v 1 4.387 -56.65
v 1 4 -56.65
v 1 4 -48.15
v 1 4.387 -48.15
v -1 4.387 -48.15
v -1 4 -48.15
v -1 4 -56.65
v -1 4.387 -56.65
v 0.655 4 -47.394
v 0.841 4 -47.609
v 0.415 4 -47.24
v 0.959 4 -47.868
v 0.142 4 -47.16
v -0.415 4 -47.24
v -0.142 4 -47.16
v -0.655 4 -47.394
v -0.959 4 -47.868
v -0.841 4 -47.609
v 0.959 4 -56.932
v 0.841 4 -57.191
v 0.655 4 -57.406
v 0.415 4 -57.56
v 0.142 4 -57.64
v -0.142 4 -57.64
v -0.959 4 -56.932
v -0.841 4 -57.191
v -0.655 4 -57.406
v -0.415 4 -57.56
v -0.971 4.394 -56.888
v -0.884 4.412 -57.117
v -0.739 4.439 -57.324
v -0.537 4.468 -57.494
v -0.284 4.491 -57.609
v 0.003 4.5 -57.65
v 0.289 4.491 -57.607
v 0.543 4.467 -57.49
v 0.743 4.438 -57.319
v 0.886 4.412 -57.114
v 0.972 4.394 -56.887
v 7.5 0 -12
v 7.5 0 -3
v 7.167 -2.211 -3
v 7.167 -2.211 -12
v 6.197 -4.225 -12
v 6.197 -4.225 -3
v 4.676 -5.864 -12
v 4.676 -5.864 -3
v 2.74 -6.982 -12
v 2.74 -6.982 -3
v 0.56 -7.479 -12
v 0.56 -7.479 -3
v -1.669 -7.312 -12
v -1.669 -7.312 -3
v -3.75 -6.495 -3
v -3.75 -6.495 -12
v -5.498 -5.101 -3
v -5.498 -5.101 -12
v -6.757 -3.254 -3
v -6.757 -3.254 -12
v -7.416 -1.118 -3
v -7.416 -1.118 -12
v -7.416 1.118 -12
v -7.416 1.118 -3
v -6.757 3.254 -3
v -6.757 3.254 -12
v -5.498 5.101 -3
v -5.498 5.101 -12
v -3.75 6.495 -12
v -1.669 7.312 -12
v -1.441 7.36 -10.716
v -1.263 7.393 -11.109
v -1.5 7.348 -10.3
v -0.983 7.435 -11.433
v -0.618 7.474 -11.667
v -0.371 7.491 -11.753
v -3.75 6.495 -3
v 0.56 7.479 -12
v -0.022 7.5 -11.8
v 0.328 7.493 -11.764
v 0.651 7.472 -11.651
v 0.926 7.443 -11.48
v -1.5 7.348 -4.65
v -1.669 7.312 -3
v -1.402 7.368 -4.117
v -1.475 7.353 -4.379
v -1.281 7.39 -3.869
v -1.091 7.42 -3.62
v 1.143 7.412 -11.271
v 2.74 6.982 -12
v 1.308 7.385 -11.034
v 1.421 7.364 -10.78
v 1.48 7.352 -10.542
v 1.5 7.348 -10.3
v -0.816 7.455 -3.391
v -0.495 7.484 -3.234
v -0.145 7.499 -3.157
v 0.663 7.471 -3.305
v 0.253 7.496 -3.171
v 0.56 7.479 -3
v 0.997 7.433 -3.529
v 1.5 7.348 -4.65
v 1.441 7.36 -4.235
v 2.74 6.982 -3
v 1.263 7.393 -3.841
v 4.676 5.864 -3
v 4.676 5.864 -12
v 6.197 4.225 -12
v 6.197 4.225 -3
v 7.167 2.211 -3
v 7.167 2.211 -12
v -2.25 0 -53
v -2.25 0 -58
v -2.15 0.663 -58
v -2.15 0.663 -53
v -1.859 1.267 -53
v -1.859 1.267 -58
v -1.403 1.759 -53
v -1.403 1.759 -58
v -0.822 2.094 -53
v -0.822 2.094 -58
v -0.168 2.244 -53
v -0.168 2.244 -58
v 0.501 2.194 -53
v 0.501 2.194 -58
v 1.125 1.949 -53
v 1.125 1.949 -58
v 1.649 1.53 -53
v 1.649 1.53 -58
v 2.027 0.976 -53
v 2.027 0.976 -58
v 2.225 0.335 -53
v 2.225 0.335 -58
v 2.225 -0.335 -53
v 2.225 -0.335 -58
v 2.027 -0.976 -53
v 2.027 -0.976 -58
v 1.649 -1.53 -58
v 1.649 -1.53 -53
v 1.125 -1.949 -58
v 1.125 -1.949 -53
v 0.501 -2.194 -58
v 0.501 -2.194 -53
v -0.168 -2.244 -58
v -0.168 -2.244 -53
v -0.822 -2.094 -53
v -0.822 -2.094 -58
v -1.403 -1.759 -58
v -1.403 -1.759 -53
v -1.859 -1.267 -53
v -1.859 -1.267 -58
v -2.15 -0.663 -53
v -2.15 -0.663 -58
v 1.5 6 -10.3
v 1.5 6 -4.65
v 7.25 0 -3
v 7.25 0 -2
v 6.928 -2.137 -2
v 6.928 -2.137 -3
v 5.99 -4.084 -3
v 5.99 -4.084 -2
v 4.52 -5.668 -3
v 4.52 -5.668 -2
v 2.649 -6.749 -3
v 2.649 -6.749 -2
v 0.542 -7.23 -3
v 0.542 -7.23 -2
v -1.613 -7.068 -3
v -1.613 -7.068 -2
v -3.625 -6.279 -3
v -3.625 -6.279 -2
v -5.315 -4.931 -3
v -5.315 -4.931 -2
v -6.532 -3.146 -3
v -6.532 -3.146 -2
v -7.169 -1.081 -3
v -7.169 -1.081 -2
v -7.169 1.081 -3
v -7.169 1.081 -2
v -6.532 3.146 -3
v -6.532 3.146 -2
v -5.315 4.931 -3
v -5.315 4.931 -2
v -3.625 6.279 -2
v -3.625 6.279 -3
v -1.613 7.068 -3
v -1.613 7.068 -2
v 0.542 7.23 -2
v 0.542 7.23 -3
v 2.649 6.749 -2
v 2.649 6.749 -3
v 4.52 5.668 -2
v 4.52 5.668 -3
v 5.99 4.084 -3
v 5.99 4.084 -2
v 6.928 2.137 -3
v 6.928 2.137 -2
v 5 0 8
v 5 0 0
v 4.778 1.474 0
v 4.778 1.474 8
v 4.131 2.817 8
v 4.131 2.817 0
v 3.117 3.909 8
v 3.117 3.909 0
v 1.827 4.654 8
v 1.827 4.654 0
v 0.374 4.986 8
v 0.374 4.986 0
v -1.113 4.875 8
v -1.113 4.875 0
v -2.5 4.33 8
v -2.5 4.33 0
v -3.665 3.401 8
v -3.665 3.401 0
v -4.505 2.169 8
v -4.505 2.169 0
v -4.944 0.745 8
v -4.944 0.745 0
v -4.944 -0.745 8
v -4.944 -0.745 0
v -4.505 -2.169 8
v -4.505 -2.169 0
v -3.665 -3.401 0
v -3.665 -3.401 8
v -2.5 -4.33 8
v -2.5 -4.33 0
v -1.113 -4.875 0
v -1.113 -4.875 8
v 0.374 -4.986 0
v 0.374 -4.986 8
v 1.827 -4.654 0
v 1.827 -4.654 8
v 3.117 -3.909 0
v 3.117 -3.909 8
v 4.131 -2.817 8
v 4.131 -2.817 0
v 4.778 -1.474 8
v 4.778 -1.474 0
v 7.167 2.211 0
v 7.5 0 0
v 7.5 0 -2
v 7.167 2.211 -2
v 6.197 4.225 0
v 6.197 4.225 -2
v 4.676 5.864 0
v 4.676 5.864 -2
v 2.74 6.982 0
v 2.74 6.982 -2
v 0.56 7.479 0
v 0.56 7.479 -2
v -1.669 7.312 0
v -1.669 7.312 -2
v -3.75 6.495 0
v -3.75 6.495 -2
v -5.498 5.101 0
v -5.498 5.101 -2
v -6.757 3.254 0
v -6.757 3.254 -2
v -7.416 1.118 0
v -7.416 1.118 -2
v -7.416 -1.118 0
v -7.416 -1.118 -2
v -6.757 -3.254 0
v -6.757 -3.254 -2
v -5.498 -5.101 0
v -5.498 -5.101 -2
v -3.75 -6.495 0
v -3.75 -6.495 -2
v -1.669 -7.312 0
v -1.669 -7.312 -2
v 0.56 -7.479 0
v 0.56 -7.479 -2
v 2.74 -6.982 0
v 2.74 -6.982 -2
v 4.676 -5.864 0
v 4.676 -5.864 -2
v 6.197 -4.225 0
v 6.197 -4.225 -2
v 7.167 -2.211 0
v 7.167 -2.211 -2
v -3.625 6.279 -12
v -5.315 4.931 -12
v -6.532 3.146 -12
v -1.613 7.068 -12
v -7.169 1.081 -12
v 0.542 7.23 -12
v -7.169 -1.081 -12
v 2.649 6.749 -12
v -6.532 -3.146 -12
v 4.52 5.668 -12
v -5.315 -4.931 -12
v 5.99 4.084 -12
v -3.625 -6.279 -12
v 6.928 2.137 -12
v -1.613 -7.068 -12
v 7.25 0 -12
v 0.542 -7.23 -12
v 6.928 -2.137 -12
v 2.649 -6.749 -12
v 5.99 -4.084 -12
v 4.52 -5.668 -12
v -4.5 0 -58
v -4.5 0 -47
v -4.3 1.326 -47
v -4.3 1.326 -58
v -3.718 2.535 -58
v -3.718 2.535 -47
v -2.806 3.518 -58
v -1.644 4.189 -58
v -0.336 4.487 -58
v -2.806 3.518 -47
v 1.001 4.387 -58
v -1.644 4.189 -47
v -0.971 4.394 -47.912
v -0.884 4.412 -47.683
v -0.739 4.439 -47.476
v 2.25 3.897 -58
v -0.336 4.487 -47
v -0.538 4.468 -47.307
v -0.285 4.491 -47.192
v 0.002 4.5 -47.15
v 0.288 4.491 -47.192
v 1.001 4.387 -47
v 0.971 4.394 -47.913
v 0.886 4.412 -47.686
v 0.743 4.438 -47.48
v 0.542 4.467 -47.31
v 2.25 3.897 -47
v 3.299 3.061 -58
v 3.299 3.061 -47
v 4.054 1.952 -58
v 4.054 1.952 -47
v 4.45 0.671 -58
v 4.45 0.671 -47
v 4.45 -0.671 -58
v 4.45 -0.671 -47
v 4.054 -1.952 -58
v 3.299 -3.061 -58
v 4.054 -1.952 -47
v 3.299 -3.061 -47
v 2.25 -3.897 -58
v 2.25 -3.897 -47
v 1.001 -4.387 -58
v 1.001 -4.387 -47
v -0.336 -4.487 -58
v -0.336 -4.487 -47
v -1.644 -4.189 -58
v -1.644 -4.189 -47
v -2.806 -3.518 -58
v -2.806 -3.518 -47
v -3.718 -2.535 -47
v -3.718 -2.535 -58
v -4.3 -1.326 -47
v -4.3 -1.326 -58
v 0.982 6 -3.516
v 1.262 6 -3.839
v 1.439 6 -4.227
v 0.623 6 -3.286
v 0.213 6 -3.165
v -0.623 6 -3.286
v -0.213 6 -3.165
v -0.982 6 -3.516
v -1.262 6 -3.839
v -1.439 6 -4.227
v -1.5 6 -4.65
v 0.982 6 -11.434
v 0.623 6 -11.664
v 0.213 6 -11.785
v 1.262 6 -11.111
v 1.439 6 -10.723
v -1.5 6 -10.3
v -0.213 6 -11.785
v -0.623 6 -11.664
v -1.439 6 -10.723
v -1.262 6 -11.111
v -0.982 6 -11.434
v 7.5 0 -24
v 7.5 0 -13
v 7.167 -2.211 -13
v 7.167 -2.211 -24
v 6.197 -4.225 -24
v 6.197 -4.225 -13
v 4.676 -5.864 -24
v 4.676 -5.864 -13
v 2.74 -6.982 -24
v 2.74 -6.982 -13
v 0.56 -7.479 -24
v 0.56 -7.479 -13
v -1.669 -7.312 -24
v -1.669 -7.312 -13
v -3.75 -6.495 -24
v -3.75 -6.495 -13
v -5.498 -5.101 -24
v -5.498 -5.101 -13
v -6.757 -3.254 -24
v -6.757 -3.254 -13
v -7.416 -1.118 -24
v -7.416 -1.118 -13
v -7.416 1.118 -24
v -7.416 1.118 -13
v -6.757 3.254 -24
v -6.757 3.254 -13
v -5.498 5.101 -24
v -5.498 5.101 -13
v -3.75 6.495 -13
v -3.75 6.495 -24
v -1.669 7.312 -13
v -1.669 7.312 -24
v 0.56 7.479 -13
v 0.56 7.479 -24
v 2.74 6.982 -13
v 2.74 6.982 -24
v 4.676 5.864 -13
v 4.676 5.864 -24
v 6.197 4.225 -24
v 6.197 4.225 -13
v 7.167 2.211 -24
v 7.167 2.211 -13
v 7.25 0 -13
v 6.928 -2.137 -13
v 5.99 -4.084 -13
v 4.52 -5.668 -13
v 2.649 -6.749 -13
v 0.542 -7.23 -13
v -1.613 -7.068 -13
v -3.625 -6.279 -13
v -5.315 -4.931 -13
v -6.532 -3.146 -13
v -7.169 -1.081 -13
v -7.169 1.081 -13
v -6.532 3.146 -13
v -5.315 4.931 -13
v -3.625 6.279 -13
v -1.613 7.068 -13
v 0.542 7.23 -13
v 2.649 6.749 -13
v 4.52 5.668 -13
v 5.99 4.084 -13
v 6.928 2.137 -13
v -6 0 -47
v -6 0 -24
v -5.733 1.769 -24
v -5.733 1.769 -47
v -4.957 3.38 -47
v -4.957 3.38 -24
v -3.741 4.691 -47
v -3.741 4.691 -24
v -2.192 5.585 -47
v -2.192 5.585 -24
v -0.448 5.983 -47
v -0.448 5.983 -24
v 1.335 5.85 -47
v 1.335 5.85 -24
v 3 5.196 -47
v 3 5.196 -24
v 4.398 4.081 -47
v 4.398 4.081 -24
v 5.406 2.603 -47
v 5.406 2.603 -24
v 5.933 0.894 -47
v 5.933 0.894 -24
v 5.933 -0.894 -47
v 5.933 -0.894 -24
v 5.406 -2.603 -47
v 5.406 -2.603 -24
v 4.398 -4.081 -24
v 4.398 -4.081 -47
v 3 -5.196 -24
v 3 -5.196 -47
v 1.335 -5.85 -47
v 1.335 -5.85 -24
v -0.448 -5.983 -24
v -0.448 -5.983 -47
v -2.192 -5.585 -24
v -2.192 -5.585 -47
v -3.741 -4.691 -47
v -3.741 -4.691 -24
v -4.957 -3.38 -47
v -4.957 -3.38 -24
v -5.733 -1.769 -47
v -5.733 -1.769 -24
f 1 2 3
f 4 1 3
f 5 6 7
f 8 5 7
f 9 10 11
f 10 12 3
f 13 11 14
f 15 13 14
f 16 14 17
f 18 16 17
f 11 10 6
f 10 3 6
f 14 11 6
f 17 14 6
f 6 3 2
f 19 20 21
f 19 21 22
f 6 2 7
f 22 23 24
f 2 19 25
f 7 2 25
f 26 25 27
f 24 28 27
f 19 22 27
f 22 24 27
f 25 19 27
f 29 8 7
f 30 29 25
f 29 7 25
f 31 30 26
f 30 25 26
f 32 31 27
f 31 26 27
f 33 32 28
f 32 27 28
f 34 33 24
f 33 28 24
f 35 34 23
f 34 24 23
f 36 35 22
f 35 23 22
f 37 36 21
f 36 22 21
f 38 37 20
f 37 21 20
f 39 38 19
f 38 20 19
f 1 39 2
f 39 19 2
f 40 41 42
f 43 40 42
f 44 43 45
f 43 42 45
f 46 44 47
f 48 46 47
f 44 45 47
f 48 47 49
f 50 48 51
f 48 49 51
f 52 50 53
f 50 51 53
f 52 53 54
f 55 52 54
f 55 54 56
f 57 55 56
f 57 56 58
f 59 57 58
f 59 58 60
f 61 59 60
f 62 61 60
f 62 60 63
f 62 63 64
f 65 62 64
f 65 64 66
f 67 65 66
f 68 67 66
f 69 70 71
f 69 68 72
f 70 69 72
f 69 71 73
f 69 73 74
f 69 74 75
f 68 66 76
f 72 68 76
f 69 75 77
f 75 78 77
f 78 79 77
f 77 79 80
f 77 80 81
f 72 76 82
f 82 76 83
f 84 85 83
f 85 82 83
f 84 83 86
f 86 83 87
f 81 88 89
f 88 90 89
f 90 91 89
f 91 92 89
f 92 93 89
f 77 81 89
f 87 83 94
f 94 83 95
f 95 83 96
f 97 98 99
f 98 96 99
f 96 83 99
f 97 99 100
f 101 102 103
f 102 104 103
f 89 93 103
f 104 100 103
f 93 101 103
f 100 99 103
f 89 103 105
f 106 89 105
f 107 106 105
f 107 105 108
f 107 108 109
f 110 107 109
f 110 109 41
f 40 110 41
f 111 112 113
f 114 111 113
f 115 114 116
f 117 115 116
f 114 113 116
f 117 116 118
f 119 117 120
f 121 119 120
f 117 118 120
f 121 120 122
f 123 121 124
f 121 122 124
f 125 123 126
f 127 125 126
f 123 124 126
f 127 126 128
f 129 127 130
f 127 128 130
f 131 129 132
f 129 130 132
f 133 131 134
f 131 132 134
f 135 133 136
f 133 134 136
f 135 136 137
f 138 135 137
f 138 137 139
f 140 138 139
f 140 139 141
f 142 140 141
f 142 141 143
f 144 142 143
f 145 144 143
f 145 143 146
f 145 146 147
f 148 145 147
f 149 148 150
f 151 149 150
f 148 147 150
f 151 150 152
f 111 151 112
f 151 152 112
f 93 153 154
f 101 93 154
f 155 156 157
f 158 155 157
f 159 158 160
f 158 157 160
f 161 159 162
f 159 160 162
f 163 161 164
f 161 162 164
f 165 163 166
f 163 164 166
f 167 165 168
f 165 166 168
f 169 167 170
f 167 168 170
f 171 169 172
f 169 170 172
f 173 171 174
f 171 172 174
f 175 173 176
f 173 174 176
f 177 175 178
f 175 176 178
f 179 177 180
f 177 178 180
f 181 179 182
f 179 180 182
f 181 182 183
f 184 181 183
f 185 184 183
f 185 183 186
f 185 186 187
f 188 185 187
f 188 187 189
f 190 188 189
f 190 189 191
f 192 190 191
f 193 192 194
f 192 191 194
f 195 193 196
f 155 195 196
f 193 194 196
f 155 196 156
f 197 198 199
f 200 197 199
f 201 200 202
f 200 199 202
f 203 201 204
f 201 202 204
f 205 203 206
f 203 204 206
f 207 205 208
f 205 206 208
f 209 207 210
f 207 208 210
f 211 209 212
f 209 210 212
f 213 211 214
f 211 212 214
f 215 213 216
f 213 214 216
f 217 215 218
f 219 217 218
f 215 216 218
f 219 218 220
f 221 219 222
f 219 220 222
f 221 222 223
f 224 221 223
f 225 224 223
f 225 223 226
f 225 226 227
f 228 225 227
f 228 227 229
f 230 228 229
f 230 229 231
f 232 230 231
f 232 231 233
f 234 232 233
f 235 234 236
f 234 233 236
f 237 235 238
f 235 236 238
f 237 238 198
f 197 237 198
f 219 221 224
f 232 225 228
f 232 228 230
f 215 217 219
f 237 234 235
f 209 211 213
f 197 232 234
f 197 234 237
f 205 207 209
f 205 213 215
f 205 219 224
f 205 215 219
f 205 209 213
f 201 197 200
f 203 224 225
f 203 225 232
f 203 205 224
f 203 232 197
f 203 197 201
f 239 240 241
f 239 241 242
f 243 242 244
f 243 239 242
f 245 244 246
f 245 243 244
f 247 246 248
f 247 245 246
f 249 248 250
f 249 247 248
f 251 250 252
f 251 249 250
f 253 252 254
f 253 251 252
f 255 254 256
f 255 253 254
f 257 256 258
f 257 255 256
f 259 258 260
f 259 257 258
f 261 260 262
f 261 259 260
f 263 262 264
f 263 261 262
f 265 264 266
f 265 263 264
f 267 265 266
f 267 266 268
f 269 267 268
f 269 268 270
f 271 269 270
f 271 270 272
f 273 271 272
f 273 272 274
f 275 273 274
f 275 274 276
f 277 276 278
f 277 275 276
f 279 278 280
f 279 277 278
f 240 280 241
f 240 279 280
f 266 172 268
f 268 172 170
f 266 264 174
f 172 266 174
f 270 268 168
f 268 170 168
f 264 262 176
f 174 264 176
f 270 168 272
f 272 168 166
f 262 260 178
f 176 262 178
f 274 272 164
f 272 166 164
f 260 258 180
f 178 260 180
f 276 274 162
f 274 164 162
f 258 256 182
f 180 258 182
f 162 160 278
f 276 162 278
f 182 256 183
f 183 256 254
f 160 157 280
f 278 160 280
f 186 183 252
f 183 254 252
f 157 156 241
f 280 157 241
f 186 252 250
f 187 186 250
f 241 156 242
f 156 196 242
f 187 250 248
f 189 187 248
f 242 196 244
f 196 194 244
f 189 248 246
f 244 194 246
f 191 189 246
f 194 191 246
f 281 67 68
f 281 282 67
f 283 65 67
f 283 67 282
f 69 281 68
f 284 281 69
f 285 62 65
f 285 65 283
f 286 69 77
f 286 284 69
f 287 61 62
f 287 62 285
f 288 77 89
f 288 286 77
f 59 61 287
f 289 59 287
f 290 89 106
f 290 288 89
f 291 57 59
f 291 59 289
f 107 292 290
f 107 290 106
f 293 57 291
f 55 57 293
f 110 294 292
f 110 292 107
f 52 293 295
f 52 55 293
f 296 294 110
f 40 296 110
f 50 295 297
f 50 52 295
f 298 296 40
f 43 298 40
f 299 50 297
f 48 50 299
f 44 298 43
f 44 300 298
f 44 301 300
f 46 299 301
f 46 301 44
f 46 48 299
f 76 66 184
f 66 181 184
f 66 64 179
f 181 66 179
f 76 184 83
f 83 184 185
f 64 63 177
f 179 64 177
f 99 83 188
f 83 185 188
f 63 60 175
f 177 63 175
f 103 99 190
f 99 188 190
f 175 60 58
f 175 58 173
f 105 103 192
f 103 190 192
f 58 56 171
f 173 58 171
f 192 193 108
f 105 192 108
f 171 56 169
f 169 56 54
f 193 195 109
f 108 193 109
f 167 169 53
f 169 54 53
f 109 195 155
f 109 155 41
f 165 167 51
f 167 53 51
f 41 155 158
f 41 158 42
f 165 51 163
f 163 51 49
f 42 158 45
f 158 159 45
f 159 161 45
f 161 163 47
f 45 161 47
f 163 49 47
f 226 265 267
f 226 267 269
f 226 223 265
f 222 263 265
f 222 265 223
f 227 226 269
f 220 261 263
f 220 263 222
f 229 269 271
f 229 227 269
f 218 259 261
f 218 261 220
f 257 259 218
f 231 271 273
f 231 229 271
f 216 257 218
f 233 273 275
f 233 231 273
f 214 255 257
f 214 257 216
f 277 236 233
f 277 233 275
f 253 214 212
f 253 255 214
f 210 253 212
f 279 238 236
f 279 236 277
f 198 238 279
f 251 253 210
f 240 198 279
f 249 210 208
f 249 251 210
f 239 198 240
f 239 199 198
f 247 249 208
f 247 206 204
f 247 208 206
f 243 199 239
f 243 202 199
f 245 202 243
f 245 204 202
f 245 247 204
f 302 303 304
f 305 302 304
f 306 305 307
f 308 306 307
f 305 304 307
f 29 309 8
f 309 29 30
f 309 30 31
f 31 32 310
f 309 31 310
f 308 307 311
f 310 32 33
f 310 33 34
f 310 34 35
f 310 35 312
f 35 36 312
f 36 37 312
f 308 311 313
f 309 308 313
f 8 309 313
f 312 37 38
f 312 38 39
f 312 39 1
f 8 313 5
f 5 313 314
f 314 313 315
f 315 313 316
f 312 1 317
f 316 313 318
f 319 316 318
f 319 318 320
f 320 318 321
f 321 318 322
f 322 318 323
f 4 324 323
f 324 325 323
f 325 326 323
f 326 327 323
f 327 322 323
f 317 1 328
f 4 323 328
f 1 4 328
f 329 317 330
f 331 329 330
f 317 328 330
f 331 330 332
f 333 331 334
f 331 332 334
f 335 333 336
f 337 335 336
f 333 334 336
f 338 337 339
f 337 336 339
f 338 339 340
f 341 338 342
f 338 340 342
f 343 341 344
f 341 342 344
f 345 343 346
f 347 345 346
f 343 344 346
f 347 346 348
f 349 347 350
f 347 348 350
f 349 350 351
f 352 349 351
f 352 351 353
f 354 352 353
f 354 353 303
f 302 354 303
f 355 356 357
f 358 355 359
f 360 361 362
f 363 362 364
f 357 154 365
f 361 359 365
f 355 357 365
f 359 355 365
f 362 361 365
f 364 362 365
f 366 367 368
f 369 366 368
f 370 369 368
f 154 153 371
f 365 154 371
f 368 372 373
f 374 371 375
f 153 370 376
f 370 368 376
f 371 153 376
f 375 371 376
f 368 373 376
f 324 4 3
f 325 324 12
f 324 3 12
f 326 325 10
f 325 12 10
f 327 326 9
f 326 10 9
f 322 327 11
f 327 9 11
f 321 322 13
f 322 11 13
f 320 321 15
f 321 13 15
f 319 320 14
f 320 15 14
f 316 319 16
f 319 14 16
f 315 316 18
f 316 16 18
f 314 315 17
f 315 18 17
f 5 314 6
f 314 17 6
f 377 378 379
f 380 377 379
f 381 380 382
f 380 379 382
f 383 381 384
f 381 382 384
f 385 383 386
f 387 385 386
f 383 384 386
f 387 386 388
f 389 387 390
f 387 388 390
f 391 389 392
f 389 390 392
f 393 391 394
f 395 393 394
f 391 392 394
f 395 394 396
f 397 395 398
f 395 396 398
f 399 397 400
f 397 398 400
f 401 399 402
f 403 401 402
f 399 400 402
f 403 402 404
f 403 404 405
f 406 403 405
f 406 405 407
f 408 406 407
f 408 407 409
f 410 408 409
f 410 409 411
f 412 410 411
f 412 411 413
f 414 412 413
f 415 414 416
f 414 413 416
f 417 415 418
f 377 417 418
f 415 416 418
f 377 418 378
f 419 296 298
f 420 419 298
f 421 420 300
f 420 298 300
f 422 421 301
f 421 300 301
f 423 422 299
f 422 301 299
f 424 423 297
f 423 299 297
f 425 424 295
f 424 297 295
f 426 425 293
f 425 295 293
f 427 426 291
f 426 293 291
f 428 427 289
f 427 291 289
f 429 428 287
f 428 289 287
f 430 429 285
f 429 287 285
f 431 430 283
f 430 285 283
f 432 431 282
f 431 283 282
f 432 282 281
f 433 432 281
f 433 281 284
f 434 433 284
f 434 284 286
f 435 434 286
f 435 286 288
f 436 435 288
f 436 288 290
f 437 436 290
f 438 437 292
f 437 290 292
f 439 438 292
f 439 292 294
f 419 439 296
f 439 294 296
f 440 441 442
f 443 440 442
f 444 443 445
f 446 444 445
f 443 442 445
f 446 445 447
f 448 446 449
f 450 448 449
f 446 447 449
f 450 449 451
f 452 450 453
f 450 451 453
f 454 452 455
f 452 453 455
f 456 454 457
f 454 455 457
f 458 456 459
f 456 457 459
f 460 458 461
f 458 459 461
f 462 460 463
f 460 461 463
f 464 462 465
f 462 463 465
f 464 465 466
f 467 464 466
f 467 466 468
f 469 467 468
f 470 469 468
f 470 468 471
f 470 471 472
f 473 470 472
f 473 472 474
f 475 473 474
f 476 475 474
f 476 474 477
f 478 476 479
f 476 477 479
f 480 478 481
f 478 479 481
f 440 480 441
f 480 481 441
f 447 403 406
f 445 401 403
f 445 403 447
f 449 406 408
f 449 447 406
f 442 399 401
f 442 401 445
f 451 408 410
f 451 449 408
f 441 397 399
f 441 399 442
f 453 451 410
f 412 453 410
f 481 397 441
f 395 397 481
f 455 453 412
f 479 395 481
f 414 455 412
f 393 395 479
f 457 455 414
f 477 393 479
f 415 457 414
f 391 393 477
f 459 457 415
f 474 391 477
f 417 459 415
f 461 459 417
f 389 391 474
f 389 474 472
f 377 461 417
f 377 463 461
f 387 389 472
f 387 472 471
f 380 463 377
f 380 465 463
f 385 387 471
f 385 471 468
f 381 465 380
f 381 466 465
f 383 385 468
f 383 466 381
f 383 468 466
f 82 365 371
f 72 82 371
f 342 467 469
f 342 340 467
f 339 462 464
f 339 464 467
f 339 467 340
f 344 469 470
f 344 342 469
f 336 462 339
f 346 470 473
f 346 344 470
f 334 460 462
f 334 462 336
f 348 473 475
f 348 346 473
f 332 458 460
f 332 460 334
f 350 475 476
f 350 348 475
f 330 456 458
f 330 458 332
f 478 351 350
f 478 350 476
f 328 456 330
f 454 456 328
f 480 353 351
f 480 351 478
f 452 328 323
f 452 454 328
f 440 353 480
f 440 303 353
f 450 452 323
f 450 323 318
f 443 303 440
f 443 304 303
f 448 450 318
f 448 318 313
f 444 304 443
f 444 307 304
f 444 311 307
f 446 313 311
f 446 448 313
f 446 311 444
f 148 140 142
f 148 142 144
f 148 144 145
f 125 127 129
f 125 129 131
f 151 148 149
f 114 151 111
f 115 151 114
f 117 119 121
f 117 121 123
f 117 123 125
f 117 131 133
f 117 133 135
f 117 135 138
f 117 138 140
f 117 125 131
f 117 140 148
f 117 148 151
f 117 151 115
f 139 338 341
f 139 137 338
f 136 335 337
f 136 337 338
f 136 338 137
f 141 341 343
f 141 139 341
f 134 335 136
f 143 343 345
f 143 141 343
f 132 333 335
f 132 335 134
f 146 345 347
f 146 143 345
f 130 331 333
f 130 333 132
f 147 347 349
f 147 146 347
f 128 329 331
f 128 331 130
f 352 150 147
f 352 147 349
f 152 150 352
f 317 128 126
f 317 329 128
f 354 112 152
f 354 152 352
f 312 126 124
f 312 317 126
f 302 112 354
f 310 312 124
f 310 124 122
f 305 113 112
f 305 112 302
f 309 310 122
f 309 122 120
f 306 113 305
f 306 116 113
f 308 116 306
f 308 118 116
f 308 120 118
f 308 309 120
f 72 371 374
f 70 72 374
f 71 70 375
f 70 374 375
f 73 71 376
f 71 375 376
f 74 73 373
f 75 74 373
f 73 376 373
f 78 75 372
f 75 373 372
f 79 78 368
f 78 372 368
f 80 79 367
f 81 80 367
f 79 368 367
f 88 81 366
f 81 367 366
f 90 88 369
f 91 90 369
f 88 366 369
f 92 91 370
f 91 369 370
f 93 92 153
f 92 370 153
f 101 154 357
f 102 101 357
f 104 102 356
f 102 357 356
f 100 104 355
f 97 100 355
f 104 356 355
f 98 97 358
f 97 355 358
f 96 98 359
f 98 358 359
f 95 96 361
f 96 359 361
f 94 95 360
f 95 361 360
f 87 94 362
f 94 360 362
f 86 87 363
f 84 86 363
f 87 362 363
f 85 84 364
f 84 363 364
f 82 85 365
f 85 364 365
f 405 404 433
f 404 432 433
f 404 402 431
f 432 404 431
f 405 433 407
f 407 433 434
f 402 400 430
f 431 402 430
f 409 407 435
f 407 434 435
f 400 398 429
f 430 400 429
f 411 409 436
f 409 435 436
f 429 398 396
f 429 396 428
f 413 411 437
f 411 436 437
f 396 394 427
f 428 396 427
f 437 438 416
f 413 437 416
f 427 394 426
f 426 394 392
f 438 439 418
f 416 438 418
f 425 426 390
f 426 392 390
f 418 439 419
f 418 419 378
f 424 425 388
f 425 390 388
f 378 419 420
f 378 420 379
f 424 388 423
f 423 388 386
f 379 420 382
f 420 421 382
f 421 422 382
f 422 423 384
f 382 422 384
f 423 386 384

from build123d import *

# Parameters (mm, degrees)
ESQUISSE1_R              = 5
BOSS_EXTRU_1_DEPTH       = 8
ESQUISSE2_R              = 7.5
BOSS_EXTRU_3_DEPTH       = 2
ESQUISSE5_R              = 7.25
BOSS_EXTRU_6_DEPTH       = 1
ESQUISSE8_R              = 7.5
BOSS_EXTRU_8_DEPTH       = 9
ESQUISSE9_R              = 7.25
BOSS_EXTRU_9_DEPTH       = 1
ESQUISSE10_R             = 7.5
BOSS_EXTRU_10_DEPTH      = 11
ESQUISSE11_R             = 6
BOSS_EXTRU_11_DEPTH      = 23
ESQUISSE12_R             = 4.5
BOSS_EXTRU_12_DEPTH      = 11
ENL_V_START              = 6
ENL_V_MAT_EXTRU_7_DEPTH  = 5
ENL_V_START_2            = 4
ENL_V_MAT_EXTRU_9_DEPTH  = 5
ESQUISSE17_R             = 2.25
ENL_V_MAT_EXTRU_10_DEPTH = 5


with BuildPart() as part:
    # Esquisse1 → Boss.-Extru.1 (new body)
    with BuildSketch(Plane.XY):
        Circle(ESQUISSE1_R)
    extrude(amount=BOSS_EXTRU_1_DEPTH)

    # Esquisse2 → Boss.-Extru.3 (add)
    with BuildSketch(Plane.XY):
        Circle(ESQUISSE2_R)
    extrude(amount=-BOSS_EXTRU_3_DEPTH)

    # Esquisse5 → Boss.-Extru.6 (add)
    with BuildSketch(Plane(origin=(0, 0, -2), x_dir=(-1, 0, 0), z_dir=(0, 0, -1))):
        with Locations(Location((0, 0, 0), (0, 0, 180))):  # turned: the seam where the file's is
            Circle(ESQUISSE5_R)
    extrude(amount=BOSS_EXTRU_6_DEPTH)

    # Esquisse8 → Boss.-Extru.8 (add)
    with BuildSketch(Plane(origin=(0, 0, -3), x_dir=(-1, 0, 0), z_dir=(0, 0, -1))):
        with Locations(Location((0, 0, 0), (0, 0, 180))):  # turned: the seam where the file's is
            Circle(ESQUISSE8_R)
    extrude(amount=BOSS_EXTRU_8_DEPTH)

    # Esquisse9 → Boss.-Extru.9 (add)
    with BuildSketch(Plane(origin=(0, 0, -12), x_dir=(-1, 0, 0), z_dir=(0, 0, -1))):
        with Locations(Location((0, 0, 0), (0, 0, 180))):  # turned: the seam where the file's is
            Circle(ESQUISSE9_R)
    extrude(amount=BOSS_EXTRU_9_DEPTH)

    # Esquisse10 → Boss.-Extru.10 (add)
    with BuildSketch(Plane(origin=(0, 0, -13), x_dir=(-1, 0, 0), z_dir=(0, 0, -1))):
        with Locations(Location((0, 0, 0), (0, 0, 180))):  # turned: the seam where the file's is
            Circle(ESQUISSE10_R)
    extrude(amount=BOSS_EXTRU_10_DEPTH)

    # Esquisse11 → Boss.-Extru.11 (add)
    with BuildSketch(Plane(origin=(0, 0, -24), x_dir=(-1, 0, 0), z_dir=(0, 0, -1))):
        Circle(ESQUISSE11_R)
    extrude(amount=BOSS_EXTRU_11_DEPTH)

    # Esquisse12 → Boss.-Extru.12 (add)
    with BuildSketch(Plane(origin=(0, 0, -47), x_dir=(-1, 0, 0), z_dir=(0, 0, -1))):
        Circle(ESQUISSE12_R)
    extrude(amount=BOSS_EXTRU_12_DEPTH)

    # Esquisse14 → Enlèv. mat.-Extru.7 (cut)
    with BuildSketch(Plane(origin=(0, 0, 0), x_dir=(1, 0, 0), z_dir=(0, 1, 0)).offset(ENL_V_START)):
        with BuildLine():
            Line((-1.5, 4.65), (-1.5, 10.3))
            ThreePointArc((-1.5, 10.3), (0, 11.8), (1.5, 10.3))
            Line((1.5, 10.3), (1.5, 4.65))
            ThreePointArc((1.5, 4.65), (0, 3.15), (-1.5, 4.65))
        make_face()
    extrude(amount=ENL_V_MAT_EXTRU_7_DEPTH, mode=Mode.SUBTRACT)

    # Esquisse15 → Enlèv. mat.-Extru.9 (cut)
    with BuildSketch(Plane(origin=(0, 0, 0), x_dir=(1, 0, 0), z_dir=(0, 1, 0)).offset(ENL_V_START_2)):
        with BuildLine():
            Line((-1, 48.15), (-1, 56.65))
            ThreePointArc((-1, 56.65), (0, 57.65), (1, 56.65))
            Line((1, 56.65), (1, 48.15))
            ThreePointArc((1, 48.15), (0, 47.15), (-1, 48.15))
        make_face()
    extrude(amount=ENL_V_MAT_EXTRU_9_DEPTH, mode=Mode.SUBTRACT)

    # Esquisse17 → Enlèv. mat.-Extru.10 (cut)
    with BuildSketch(Plane(origin=(0, 0, -58), x_dir=(-1, 0, 0), z_dir=(0, 0, -1))):
        Circle(ESQUISSE17_R)
    extrude(amount=-ENL_V_MAT_EXTRU_10_DEPTH, mode=Mode.SUBTRACT)


solid = part.part
